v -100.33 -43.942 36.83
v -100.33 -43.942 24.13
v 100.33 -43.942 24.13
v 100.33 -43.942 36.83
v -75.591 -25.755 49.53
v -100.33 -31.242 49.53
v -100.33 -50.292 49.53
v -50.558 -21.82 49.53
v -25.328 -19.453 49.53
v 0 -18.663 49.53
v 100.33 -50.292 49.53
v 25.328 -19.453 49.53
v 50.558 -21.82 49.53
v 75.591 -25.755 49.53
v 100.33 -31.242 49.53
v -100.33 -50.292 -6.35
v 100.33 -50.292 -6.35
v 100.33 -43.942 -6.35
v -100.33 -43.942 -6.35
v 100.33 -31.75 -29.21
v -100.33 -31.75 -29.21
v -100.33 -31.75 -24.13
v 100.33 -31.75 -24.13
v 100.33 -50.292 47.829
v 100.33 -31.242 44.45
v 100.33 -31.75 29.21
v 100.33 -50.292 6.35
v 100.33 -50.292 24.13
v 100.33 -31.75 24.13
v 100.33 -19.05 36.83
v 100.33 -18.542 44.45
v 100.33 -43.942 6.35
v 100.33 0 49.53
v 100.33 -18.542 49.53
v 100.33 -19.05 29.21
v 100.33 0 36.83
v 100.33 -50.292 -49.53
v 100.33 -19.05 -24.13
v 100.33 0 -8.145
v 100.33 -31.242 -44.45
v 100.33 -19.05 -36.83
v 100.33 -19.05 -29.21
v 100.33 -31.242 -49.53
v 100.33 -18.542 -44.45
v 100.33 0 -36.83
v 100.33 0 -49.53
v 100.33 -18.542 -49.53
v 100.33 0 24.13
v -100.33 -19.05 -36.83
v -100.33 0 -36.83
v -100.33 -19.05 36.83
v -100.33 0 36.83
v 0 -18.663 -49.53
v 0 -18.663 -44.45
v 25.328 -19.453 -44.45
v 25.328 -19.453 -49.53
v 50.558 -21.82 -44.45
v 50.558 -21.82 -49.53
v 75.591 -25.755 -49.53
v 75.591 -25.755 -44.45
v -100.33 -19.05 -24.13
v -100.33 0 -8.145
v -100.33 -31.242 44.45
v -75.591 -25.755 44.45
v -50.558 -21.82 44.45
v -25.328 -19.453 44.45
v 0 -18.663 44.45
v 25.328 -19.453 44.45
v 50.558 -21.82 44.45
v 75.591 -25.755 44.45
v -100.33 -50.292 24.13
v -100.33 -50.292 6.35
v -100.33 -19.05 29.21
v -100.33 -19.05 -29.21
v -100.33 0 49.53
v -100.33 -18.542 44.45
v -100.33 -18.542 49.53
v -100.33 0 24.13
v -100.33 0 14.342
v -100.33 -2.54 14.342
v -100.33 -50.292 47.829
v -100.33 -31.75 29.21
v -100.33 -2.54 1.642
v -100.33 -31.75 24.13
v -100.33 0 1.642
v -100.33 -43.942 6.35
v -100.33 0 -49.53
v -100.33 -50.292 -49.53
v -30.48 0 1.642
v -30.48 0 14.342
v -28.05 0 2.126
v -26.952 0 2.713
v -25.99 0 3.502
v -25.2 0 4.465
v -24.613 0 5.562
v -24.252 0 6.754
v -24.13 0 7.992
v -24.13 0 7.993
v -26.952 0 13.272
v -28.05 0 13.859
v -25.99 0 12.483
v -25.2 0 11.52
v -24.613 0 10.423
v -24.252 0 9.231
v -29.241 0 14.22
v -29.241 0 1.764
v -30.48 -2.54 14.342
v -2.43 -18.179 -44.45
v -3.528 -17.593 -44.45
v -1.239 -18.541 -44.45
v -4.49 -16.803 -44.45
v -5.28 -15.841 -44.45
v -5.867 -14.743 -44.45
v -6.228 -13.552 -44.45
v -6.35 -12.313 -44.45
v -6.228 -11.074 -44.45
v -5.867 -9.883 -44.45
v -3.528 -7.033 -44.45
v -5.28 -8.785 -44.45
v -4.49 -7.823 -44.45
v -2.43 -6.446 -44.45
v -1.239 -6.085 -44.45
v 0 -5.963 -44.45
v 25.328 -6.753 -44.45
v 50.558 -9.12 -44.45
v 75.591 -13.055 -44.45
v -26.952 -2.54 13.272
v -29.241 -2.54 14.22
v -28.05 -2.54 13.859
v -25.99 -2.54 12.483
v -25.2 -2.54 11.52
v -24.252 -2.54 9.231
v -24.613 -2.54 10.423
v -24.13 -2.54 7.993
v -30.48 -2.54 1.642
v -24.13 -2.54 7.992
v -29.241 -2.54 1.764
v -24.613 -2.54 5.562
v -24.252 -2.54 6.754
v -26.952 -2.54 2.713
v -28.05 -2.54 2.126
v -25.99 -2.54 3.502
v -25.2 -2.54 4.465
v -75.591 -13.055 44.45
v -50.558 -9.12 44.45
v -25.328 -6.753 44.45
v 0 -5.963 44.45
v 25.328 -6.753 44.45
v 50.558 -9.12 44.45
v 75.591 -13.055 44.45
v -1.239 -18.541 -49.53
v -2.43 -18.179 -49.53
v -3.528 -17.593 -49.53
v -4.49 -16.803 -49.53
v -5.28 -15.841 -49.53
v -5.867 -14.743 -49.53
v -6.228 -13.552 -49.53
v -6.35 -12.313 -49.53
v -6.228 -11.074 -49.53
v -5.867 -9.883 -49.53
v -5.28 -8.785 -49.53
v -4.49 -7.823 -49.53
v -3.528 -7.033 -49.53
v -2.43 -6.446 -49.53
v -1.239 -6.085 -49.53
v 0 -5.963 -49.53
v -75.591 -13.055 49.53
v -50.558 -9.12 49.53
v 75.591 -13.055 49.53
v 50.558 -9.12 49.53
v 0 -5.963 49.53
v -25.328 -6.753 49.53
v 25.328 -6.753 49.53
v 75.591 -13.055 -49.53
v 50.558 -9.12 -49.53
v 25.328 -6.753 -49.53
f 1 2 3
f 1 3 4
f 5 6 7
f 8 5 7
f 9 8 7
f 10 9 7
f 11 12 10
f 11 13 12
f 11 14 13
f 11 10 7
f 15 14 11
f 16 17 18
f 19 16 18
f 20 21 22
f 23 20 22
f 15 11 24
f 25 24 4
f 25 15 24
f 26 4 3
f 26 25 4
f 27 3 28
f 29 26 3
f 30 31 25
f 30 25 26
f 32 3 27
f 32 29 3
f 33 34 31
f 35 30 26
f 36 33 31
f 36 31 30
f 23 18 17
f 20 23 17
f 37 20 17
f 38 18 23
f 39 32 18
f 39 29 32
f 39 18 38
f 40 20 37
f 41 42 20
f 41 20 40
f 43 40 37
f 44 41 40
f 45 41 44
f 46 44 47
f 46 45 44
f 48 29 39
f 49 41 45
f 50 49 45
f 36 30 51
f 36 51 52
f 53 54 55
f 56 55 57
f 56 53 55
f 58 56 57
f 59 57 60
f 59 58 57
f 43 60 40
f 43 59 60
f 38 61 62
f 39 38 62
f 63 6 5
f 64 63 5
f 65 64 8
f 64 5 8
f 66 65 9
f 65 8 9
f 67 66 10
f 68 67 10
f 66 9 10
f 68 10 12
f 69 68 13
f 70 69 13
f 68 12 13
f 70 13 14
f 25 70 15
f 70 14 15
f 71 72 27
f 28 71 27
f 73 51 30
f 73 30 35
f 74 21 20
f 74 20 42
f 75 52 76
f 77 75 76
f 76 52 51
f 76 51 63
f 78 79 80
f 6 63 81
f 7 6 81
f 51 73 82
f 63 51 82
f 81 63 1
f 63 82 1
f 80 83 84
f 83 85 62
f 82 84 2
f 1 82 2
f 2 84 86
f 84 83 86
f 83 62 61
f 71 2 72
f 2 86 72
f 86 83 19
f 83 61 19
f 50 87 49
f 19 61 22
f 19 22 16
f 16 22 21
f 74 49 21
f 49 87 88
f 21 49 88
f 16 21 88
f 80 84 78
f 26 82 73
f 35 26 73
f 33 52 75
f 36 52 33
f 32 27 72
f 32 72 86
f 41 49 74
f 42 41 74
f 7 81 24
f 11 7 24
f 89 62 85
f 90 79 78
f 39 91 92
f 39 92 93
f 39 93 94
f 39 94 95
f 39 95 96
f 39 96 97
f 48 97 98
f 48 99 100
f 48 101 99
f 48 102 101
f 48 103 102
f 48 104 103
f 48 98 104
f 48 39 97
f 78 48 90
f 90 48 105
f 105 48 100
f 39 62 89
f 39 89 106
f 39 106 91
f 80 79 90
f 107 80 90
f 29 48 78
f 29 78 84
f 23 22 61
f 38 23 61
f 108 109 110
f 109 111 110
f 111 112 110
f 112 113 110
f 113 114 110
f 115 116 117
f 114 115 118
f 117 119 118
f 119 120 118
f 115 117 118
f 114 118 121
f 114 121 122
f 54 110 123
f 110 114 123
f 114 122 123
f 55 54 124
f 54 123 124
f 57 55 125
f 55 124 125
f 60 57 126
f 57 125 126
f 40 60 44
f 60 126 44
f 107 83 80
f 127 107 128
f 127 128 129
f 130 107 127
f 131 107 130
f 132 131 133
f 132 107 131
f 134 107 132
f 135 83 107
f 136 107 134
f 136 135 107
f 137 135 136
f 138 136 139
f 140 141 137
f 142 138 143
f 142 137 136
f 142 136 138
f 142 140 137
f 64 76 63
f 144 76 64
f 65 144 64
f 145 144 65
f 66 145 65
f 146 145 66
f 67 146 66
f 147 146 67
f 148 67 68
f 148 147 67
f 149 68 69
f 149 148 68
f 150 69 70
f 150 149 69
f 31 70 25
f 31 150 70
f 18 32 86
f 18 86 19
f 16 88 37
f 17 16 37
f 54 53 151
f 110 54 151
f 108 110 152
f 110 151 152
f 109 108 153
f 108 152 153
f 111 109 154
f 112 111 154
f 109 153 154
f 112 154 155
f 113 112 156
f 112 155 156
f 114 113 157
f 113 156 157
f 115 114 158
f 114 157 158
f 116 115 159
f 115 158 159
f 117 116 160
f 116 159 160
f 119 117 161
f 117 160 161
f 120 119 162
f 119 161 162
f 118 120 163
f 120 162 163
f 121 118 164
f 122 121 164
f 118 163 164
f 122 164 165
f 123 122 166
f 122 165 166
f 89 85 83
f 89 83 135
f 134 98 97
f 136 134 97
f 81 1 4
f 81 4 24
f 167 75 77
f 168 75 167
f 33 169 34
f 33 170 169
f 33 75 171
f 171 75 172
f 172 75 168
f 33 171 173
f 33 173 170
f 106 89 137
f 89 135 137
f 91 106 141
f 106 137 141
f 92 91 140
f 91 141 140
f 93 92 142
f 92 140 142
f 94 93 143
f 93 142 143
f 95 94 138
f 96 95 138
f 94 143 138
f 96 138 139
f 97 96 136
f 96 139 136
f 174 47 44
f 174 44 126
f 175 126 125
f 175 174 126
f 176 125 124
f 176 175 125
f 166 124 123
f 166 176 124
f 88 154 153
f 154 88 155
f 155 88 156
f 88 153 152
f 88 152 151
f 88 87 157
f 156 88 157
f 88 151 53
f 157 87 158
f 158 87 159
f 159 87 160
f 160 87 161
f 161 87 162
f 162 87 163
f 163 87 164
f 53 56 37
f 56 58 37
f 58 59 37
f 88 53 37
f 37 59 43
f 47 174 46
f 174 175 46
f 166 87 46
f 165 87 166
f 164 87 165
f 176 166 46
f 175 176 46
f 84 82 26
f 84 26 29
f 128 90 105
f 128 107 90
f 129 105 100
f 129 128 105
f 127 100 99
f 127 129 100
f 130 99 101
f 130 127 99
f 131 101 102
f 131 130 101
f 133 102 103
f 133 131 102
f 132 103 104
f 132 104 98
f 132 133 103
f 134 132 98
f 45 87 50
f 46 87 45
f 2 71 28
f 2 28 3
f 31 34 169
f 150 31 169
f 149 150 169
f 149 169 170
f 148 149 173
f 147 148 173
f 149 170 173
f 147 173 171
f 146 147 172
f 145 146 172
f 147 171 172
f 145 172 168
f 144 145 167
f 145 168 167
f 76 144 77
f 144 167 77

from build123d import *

# Parameters (mm, degrees)
SKETCH1_W           = 200.66
SKETCH1_H           = 99.06
BOSS_EXTRUDE1_DEPTH = 50.292
SKETCH2_W           = 12.7
SKETCH2_H           = 19.05
CUT_EXTRUDE1_DEPTH  = 213.713285349
SKETCH3_W           = 5.08
SKETCH3_H           = 12.7
CUT_EXTRUDE2_DEPTH  = 213.713285349
CUT_EXTRUDE3_DEPTH  = 213.713285349
BOSS_EXTRUDE2_DEPTH = 200.66
SKETCH6_W           = 12.7
SKETCH6_H           = 6.35
CUT_EXTRUDE4_DEPTH  = 213.713285349
CUT_EXTRUDE5_DEPTH  = 213.713285349
CUT_EXTRUDE6_DEPTH  = 5.08
BOSS_EXTRUDE3_DEPTH = 5.08
SKETCH13_W          = 152.4
SKETCH13_H          = 12.7
CUT_EXTRUDE7_DEPTH  = 2.54
FILLET1_R           = 6.35


with BuildPart() as part:
    # Sketch1 → Boss-Extrude1 (new body)
    with BuildSketch(Plane(origin=(0, 0, 0), x_dir=(1, 0, 0), z_dir=(0, 1, 0))):
        Rectangle(SKETCH1_W, SKETCH1_H)
    extrude(amount=-BOSS_EXTRUDE1_DEPTH)

    # Sketch2 → Cut-Extrude1 (cut, through all)
    with BuildSketch(Plane.ZY.offset(100.33)):
        with Locations((-30.48, -9.525)):
            Rectangle(SKETCH2_W, SKETCH2_H)
    cut_extrude1 = extrude(amount=-CUT_EXTRUDE1_DEPTH, mode=Mode.SUBTRACT)

    # Sketch3 → Cut-Extrude2 (cut, through all)
    with BuildSketch(Plane.ZY.offset(100.33)):
        with Locations((-26.67, -25.4)):
            Rectangle(SKETCH3_W, SKETCH3_H)
    cut_extrude2 = extrude(amount=-CUT_EXTRUDE2_DEPTH, mode=Mode.SUBTRACT)

    # Sketch4 → Cut-Extrude3 (cut, through all)
    with BuildSketch(Plane.ZY.offset(100.33)):
        Polygon((-24.13, -19.05), (-8.145152026, 0), (-24.13, 0), align=None)
    cut_extrude3 = extrude(amount=-CUT_EXTRUDE3_DEPTH, mode=Mode.SUBTRACT)

    # Mirror1: Cut-Extrude1, Cut-Extrude2, Cut-Extrude3 across plane
    add(cut_extrude1.mirror(Plane.XY), mode=Mode.SUBTRACT)
    add(cut_extrude2.mirror(Plane.XY), mode=Mode.SUBTRACT)
    add(cut_extrude3.mirror(Plane.XY), mode=Mode.SUBTRACT)

    # Sketch5 → Boss-Extrude2 (add)
    with BuildSketch(Plane(origin=(100.33, 0, 0), x_dir=(0, 0, -1), z_dir=(1, 0, 0))):
        Polygon((-24.13, -19.05), (-8.145152026, 0), (-24.13, 0), align=None)
    extrude(amount=-BOSS_EXTRUDE2_DEPTH)

    # Sketch6 → Cut-Extrude4 (cut, through all)
    with BuildSketch(Plane(origin=(100.33, 0, 0), x_dir=(0, 0, -1), z_dir=(1, 0, 0))):
        with Locations((0, -47.117)):
            Rectangle(SKETCH6_W, SKETCH6_H)
    extrude(amount=-CUT_EXTRUDE4_DEPTH, mode=Mode.SUBTRACT)

    # Sketch7 → Cut-Extrude5 (cut, through all)
    with BuildSketch(Plane.ZY.offset(100.33)):
        Polygon((24.13, -50.292), (24.13, -43.942), (36.83, -43.942), (47.828522628, -50.292), align=None)
    extrude(amount=-CUT_EXTRUDE5_DEPTH, mode=Mode.SUBTRACT)

    # Sketch8 → Cut-Extrude6 (cut)
    with BuildSketch(Plane.XY.offset(49.53)):
        with BuildLine():
            Line((-100.33, -18.542), (-100.33, -31.242))
            ThreePointArc((-100.33, -31.242), (0, -18.662836295), (100.33, -31.242))
            Line((100.33, -31.242), (100.33, -18.542))
            ThreePointArc((100.33, -18.542), (0, -5.962836295), (-100.33, -18.542))
        make_face()
    cut_extrude6 = extrude(amount=-CUT_EXTRUDE6_DEPTH, mode=Mode.SUBTRACT)

    # Mirror2: Cut-Extrude6 across plane
    add(cut_extrude6.mirror(Plane.XY), mode=Mode.SUBTRACT)

    # Sketch9 → Boss-Extrude3 (add)
    with BuildSketch(Plane(origin=(0, 0, -49.53), x_dir=(-1, 0, 0), z_dir=(0, 0, -1))):
        with BuildLine():
            Line((100.33, -18.542), (100.33, -31.242))
            ThreePointArc((100.33, -31.242), (50.5577498, -21.819889754), (0, -18.662836295))
            ThreePointArc((0, -18.662836295), (6.35, -12.312836295), (0, -5.962836295))
            ThreePointArc((0, -5.962836295), (50.5577498, -9.119889754), (100.33, -18.542))
        make_face()
    extrude(amount=-BOSS_EXTRUDE3_DEPTH)

    # Sketch13 → Cut-Extrude7 (cut)
    with BuildSketch(Plane(origin=(0, 0, 0), x_dir=(1, 0, 0), z_dir=(0, 1, 0))):
        with Locations((-100.33, -7.992423987)):
            Rectangle(SKETCH13_W, SKETCH13_H)
    extrude(amount=-CUT_EXTRUDE7_DEPTH, mode=Mode.SUBTRACT)

    # Fillet1
    fillet1_edges = [part.edges().sort_by_distance(p)[0] for p in [
        (-24.13, -1.27, 14.342423987),
        (-24.13, -1.27, 1.642423987),
    ]]
    fillet(fillet1_edges, radius=FILLET1_R - 0.0001)  # a hair under: the kernel refuses the full size


solid = part.part
